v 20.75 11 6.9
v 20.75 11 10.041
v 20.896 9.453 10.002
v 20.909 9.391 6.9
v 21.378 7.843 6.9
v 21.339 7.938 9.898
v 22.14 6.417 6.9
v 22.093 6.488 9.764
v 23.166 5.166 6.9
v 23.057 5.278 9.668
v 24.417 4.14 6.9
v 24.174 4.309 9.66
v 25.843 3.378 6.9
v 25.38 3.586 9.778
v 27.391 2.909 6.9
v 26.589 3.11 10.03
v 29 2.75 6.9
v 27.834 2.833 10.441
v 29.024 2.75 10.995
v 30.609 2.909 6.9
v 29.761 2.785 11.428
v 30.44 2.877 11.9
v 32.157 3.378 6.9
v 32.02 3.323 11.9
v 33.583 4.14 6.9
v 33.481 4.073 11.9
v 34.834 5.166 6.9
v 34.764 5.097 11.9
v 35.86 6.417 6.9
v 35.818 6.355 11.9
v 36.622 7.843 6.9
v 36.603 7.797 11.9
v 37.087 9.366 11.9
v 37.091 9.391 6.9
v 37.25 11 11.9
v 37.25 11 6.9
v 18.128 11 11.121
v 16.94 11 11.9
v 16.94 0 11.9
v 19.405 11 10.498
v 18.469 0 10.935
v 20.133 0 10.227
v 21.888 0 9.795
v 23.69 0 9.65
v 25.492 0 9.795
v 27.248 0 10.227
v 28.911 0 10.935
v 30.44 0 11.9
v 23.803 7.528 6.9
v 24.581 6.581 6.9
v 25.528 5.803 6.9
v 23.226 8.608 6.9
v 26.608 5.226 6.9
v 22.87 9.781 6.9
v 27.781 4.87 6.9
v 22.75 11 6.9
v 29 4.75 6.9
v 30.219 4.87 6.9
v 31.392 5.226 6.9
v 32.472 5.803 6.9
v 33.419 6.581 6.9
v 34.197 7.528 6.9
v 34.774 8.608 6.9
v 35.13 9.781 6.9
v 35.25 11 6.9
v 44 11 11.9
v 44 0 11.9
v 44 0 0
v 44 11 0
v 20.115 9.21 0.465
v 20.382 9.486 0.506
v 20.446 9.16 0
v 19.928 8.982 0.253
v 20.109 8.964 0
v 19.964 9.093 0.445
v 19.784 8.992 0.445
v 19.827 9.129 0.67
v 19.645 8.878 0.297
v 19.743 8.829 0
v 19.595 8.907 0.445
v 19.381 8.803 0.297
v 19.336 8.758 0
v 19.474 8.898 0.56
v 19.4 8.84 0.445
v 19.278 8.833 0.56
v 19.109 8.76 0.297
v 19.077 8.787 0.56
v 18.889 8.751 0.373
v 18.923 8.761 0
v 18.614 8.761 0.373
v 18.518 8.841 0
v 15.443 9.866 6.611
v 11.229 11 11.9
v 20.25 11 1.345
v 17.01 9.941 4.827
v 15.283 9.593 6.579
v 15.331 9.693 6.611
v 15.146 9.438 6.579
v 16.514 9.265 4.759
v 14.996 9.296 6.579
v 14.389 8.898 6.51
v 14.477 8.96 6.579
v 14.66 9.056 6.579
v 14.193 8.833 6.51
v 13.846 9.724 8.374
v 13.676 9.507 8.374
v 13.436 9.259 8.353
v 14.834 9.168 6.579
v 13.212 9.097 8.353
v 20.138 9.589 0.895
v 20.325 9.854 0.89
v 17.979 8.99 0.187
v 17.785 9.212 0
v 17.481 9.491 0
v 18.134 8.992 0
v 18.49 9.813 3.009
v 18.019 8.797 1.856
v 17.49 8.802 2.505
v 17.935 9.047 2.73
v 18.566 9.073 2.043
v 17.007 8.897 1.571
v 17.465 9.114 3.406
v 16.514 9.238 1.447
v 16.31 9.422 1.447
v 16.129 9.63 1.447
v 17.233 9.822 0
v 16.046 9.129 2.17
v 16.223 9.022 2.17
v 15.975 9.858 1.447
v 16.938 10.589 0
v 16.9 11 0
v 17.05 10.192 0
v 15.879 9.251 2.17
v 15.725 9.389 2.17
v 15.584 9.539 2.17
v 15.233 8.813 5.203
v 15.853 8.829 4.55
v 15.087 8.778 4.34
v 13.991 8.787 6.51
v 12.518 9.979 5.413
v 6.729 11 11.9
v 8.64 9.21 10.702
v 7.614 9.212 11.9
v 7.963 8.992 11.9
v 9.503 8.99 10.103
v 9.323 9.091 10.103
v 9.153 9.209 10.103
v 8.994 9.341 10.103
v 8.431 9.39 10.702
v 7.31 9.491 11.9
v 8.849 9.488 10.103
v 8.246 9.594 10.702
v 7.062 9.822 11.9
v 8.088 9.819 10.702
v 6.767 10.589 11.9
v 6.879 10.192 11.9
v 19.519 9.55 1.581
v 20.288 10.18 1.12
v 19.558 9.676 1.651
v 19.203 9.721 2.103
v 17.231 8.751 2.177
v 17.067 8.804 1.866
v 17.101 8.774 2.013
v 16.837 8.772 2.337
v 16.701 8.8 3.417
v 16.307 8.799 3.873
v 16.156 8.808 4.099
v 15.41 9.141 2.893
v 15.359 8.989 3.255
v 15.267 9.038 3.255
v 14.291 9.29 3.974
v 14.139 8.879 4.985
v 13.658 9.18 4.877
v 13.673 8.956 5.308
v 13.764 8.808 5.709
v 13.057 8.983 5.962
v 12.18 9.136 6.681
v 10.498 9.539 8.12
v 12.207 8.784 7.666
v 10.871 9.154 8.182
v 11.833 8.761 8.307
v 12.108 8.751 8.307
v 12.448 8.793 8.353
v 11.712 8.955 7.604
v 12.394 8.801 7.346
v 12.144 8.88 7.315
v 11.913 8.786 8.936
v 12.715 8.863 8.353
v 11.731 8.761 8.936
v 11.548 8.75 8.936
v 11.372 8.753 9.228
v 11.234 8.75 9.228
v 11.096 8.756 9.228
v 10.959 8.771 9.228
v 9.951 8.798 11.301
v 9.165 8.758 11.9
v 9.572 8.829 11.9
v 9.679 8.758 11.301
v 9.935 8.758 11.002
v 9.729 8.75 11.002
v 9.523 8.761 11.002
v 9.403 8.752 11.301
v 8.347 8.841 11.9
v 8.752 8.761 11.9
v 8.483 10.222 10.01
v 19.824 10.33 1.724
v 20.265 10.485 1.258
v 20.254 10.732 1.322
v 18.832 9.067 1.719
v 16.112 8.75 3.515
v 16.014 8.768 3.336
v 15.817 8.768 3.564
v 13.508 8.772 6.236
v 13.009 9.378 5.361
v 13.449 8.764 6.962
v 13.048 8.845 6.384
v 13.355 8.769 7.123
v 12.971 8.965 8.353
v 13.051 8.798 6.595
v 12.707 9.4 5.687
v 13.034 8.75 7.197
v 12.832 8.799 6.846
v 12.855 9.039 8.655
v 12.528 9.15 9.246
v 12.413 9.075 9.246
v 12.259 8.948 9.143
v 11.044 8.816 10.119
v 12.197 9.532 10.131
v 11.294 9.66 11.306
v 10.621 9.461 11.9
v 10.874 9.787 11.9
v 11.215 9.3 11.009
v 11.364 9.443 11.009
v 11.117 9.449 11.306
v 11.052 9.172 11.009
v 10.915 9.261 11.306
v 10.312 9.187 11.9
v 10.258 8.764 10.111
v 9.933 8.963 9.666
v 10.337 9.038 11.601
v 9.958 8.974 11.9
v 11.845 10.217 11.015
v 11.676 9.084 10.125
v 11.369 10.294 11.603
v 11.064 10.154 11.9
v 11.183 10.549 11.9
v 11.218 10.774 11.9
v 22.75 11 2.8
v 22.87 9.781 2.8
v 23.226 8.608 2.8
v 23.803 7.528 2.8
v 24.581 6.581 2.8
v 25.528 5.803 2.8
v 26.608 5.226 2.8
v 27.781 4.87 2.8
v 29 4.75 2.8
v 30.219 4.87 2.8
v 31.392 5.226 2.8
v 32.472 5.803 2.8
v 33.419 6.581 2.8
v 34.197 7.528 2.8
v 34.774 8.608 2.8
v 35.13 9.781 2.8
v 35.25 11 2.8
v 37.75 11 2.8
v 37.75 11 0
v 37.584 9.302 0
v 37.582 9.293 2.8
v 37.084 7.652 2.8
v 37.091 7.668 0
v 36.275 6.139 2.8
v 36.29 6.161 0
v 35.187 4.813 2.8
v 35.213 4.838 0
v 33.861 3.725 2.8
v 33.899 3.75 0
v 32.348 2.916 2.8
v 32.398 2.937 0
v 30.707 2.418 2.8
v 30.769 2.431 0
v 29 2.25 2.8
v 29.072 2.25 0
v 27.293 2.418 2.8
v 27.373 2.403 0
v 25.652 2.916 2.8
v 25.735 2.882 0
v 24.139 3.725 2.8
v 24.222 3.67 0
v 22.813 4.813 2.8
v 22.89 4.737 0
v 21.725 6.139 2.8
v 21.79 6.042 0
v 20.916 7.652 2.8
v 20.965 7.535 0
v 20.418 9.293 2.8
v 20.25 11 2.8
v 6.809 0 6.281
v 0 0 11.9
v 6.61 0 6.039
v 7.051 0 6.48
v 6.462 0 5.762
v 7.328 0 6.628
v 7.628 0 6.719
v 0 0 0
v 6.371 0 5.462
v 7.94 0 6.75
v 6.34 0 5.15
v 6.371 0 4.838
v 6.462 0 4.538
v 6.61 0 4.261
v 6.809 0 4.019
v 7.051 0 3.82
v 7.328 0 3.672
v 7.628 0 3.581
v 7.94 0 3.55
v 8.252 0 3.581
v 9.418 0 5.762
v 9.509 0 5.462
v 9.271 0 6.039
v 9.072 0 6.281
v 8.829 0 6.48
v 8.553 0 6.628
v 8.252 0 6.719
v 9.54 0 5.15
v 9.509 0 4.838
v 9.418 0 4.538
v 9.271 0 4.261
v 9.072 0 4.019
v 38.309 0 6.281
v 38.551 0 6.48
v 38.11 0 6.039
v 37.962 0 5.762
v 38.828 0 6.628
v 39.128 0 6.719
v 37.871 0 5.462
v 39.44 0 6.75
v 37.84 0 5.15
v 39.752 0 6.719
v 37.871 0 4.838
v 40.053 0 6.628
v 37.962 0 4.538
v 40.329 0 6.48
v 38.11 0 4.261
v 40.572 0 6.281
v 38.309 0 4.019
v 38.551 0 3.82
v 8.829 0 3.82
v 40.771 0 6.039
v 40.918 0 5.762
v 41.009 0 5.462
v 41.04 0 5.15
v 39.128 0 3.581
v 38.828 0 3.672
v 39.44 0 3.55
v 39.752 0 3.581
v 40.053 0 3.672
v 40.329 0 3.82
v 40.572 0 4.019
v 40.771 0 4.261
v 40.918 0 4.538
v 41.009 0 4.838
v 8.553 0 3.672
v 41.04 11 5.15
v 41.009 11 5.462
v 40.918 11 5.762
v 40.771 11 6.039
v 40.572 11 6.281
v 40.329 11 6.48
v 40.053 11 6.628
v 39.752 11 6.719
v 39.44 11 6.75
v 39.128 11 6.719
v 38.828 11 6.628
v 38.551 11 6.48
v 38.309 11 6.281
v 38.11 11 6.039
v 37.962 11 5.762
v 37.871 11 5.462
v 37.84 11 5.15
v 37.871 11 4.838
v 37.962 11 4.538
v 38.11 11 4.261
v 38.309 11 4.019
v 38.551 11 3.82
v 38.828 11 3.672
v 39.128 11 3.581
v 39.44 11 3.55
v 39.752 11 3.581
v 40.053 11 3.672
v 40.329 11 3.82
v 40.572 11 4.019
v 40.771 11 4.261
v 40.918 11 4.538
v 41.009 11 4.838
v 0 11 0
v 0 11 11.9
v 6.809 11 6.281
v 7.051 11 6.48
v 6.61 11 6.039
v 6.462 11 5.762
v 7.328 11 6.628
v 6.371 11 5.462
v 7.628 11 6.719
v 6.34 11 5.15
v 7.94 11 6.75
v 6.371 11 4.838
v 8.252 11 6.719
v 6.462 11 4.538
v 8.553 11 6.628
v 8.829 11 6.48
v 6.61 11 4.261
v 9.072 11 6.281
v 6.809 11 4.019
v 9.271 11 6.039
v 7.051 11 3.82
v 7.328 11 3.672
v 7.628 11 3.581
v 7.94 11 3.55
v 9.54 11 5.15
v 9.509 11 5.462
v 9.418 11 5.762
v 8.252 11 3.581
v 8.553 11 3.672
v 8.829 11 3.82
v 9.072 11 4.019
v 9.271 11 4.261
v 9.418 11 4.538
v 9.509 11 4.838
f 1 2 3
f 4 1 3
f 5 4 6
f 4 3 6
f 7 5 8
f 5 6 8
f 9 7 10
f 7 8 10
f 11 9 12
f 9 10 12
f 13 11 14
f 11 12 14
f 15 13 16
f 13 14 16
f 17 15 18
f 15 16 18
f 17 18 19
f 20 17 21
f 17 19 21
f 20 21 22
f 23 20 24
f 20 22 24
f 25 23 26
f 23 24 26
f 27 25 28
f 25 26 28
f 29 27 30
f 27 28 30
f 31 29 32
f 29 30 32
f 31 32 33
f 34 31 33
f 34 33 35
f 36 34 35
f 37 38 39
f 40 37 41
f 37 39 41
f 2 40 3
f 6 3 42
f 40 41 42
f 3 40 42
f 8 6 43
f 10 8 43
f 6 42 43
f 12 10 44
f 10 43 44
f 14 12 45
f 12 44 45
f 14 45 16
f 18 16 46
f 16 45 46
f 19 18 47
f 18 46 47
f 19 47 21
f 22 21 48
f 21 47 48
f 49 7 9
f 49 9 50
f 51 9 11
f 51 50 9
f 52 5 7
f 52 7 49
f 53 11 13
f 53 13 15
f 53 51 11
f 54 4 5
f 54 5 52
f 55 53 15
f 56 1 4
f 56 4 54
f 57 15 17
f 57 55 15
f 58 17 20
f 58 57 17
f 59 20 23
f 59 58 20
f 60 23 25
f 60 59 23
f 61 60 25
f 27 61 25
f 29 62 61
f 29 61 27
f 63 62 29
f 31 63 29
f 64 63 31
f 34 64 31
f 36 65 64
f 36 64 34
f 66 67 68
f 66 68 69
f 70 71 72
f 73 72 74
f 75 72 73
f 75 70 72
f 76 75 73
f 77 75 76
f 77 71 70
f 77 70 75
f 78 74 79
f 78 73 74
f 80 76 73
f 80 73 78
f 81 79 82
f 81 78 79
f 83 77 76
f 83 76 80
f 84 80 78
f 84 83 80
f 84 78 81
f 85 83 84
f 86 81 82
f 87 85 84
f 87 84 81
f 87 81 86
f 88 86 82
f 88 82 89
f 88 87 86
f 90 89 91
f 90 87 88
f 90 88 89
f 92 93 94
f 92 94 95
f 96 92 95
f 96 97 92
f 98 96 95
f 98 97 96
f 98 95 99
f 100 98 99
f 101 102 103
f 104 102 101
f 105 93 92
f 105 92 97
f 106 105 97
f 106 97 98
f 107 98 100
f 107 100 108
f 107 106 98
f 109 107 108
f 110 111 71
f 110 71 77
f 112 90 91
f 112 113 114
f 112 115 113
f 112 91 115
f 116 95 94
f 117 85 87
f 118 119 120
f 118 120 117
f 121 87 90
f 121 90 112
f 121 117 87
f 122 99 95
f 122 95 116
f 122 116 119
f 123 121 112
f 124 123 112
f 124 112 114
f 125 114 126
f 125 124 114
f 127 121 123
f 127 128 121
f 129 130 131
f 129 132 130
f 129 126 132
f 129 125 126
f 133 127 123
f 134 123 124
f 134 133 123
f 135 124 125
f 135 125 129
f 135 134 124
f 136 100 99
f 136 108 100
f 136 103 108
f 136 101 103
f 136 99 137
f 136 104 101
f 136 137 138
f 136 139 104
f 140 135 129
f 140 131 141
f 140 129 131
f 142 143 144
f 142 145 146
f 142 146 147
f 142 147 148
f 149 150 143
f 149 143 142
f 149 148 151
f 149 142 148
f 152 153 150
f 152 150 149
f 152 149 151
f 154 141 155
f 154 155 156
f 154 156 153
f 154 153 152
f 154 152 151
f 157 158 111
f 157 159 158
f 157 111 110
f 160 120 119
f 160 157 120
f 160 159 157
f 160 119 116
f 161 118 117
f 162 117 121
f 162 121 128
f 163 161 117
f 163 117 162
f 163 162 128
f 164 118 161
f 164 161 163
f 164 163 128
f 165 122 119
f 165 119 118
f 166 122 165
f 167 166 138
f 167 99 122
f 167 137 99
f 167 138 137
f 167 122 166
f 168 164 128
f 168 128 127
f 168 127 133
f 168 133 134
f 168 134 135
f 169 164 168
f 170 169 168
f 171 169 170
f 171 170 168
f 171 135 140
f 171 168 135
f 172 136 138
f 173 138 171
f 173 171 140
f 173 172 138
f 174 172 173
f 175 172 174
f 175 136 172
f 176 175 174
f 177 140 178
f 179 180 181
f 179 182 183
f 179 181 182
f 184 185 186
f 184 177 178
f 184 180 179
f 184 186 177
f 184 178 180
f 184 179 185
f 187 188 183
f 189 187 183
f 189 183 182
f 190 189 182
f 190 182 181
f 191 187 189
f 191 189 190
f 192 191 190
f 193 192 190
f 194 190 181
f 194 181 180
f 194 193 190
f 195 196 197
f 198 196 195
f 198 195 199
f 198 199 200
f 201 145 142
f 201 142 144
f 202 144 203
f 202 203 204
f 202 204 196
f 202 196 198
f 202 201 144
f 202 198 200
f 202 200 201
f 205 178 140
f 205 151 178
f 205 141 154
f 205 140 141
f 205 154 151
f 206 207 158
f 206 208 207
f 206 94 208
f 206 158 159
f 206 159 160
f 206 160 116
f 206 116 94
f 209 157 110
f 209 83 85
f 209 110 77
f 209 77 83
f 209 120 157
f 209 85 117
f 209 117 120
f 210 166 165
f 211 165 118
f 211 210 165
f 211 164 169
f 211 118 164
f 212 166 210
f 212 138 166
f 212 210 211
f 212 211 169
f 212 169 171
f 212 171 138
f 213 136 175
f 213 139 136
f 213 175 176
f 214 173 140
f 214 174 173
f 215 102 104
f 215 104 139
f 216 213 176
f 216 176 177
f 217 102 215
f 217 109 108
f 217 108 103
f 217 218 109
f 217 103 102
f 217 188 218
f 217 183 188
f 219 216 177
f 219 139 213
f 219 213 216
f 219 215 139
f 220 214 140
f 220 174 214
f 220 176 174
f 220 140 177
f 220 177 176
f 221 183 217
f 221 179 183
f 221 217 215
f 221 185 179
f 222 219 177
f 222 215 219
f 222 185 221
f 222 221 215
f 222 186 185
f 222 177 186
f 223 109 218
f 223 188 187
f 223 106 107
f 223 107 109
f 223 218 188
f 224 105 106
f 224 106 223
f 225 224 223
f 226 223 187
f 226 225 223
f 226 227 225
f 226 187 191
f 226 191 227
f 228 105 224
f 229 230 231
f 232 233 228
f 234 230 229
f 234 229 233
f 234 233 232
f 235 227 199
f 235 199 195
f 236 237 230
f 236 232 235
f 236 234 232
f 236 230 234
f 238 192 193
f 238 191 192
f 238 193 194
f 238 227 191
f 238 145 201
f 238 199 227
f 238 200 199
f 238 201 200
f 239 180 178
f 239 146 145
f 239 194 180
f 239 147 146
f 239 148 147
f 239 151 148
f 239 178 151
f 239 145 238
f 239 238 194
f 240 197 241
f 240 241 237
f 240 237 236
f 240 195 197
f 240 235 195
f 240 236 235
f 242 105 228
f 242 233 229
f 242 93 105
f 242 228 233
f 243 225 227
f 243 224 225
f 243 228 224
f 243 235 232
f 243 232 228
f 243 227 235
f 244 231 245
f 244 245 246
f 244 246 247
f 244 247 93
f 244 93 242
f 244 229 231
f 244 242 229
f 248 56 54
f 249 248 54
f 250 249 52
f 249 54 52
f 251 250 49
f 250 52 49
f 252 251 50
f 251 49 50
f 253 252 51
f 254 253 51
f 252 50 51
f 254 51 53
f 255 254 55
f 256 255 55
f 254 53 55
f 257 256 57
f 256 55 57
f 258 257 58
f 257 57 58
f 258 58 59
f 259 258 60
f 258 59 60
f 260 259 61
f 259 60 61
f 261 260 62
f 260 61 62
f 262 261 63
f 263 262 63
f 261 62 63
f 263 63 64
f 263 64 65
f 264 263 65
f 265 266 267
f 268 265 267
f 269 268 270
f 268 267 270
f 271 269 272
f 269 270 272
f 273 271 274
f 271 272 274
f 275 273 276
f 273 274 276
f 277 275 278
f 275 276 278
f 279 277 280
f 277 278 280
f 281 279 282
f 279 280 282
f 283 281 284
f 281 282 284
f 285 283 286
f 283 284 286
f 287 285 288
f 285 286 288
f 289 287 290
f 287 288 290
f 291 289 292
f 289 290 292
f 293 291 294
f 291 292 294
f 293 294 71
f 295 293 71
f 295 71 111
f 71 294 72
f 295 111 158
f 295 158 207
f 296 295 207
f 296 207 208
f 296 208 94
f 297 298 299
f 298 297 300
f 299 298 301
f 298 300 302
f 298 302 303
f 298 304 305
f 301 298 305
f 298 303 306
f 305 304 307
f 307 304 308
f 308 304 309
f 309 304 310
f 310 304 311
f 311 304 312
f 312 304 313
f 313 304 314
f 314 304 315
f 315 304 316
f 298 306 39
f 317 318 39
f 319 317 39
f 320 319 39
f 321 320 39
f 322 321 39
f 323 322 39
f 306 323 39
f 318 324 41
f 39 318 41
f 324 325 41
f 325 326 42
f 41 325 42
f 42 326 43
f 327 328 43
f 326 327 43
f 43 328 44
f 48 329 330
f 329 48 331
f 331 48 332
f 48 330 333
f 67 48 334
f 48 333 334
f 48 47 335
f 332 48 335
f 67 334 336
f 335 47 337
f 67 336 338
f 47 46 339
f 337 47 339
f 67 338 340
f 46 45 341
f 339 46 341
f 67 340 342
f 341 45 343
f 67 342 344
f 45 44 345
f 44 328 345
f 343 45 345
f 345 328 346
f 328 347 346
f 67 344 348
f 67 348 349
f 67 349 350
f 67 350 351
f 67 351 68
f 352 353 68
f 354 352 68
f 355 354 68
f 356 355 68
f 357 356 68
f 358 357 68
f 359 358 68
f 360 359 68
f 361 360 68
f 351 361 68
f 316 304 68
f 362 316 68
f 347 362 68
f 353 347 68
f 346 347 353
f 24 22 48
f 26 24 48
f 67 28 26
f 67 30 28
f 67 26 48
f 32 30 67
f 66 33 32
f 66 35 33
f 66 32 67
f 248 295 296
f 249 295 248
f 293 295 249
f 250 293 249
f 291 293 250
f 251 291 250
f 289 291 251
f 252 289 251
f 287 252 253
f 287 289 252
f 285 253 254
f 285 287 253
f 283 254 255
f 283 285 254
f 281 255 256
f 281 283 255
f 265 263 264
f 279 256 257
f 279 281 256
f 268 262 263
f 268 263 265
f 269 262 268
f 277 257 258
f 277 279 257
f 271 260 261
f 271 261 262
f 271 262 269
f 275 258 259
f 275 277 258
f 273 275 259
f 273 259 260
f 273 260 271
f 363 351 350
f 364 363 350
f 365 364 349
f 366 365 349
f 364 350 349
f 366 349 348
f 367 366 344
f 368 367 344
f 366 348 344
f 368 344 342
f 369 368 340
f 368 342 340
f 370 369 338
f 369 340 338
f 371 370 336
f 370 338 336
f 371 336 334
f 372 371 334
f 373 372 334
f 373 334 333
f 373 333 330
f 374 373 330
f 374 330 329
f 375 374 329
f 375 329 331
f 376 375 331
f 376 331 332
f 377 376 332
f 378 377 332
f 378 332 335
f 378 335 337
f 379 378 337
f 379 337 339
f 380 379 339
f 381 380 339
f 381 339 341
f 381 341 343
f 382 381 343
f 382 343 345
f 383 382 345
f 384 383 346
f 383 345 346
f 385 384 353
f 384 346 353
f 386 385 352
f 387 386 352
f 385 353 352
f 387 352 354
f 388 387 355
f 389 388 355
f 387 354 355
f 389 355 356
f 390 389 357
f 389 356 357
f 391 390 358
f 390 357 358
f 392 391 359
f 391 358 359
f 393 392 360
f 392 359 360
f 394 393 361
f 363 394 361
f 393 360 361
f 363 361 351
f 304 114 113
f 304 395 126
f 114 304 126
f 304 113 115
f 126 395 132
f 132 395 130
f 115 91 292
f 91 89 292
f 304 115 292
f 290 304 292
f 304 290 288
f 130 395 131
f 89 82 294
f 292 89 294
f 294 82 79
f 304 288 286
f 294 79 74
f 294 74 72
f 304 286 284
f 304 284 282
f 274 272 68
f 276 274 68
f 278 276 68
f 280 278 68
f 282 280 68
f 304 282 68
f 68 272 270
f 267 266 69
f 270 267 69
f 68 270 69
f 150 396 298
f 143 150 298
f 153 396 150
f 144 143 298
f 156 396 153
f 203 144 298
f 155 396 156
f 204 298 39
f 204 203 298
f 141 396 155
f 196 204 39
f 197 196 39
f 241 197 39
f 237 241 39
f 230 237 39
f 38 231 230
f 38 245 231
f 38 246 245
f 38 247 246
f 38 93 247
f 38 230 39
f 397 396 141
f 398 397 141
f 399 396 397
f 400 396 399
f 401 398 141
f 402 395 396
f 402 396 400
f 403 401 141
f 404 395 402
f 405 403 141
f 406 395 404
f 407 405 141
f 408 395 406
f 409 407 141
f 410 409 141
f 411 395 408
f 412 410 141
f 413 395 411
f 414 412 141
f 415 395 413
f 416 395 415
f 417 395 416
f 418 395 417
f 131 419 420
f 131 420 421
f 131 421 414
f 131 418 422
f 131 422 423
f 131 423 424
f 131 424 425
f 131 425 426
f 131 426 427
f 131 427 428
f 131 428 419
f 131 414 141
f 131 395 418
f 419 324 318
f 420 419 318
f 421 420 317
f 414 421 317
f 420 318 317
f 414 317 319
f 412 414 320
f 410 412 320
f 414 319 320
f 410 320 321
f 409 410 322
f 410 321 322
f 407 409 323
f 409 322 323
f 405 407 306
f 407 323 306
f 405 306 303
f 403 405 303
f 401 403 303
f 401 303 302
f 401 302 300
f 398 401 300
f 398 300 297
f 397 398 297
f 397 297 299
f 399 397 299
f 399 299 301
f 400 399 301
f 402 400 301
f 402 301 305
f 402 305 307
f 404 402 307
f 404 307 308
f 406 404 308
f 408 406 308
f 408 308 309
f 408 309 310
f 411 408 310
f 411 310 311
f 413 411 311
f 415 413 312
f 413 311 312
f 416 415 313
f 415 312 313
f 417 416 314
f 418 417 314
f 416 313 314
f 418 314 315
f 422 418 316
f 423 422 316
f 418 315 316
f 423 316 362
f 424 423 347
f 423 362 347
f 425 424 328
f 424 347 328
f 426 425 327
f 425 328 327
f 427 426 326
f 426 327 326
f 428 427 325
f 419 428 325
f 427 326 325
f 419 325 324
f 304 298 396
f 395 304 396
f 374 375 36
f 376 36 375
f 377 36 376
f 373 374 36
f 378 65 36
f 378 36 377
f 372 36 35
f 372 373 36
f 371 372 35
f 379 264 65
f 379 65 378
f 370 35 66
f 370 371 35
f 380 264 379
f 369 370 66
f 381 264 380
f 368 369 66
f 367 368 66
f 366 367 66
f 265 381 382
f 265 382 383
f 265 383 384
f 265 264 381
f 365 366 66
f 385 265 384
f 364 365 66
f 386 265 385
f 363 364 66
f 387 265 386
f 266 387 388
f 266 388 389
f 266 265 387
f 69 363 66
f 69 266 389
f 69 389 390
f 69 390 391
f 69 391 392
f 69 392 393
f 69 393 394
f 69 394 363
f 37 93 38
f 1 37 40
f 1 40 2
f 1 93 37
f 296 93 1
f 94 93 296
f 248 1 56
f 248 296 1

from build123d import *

# Parameters (mm, degrees)
F0_W     = 44
F0_H     = 11
F1_DEPTH = 11.9
F2_R     = 6.25
F3_DEPTH = 25
F4_R     = 8.25
F5_DEPTH = 5
F6_R     = 8.75
F7_DEPTH = 2.8
F8_R     = 1.6
F8_R_2   = 11.25
F9_DEPTH = 25
F11_R    = 2.25


with BuildPart() as f1:
    # F0 (on Top) → F1 (new body)
    with BuildSketch(Plane.XY):
        with Locations((22, 5.5)):
            Rectangle(F0_W, F0_H)
    extrude(amount=F1_DEPTH)

    # F2 (on face) → F3 (cut)
    with BuildSketch(Plane.XY.offset(11.9)):
        with Locations((29, 11)):
            Circle(F2_R)
    extrude(amount=-F3_DEPTH, mode=Mode.SUBTRACT)

    # F4 (on face) → F5 (cut)
    with BuildSketch(Plane.XY.offset(11.9)):
        with Locations((29, 11)):
            Circle(F4_R)
    extrude(amount=-F5_DEPTH, mode=Mode.SUBTRACT)

    # F6 (on face) → F7 (cut)
    with BuildSketch(Plane(origin=(0, 0, 0), x_dir=(1, 0, 0), z_dir=(0, 0, -1))):
        with Locations((29, -11)):
            Circle(F6_R)
    extrude(amount=-F7_DEPTH, mode=Mode.SUBTRACT)

    # F8 (on face) → F9 (cut)
    with BuildSketch(Plane.XZ):
        with Locations((39.440233, 5.15)):
            Circle(F8_R)
        with Locations((7.940233, 5.15)):
            Circle(F8_R)
        with Locations((23.690233, 20.9)):
            Circle(F8_R_2)
    extrude(amount=-F9_DEPTH, mode=Mode.SUBTRACT)

    # F12: sweep along a path in F10
    with BuildLine(Plane(origin=(0, 11, 0), x_dir=(-1, 0, 0), z_dir=(0, 1, 0))) as f12_path:
        Line((-22.5, -6.5), (-2.5, 16.9))
    # F11 (on face) → F12 (sweep, cut)
    with BuildSketch(Plane(origin=(0, 0, 0), x_dir=(1, 0, 0), z_dir=(0, 0, -1))):
        with Locations((19.15, -11)):
            Circle(F11_R)
    sweep(path=f12_path.line, mode=Mode.SUBTRACT)


solid = f1.part
